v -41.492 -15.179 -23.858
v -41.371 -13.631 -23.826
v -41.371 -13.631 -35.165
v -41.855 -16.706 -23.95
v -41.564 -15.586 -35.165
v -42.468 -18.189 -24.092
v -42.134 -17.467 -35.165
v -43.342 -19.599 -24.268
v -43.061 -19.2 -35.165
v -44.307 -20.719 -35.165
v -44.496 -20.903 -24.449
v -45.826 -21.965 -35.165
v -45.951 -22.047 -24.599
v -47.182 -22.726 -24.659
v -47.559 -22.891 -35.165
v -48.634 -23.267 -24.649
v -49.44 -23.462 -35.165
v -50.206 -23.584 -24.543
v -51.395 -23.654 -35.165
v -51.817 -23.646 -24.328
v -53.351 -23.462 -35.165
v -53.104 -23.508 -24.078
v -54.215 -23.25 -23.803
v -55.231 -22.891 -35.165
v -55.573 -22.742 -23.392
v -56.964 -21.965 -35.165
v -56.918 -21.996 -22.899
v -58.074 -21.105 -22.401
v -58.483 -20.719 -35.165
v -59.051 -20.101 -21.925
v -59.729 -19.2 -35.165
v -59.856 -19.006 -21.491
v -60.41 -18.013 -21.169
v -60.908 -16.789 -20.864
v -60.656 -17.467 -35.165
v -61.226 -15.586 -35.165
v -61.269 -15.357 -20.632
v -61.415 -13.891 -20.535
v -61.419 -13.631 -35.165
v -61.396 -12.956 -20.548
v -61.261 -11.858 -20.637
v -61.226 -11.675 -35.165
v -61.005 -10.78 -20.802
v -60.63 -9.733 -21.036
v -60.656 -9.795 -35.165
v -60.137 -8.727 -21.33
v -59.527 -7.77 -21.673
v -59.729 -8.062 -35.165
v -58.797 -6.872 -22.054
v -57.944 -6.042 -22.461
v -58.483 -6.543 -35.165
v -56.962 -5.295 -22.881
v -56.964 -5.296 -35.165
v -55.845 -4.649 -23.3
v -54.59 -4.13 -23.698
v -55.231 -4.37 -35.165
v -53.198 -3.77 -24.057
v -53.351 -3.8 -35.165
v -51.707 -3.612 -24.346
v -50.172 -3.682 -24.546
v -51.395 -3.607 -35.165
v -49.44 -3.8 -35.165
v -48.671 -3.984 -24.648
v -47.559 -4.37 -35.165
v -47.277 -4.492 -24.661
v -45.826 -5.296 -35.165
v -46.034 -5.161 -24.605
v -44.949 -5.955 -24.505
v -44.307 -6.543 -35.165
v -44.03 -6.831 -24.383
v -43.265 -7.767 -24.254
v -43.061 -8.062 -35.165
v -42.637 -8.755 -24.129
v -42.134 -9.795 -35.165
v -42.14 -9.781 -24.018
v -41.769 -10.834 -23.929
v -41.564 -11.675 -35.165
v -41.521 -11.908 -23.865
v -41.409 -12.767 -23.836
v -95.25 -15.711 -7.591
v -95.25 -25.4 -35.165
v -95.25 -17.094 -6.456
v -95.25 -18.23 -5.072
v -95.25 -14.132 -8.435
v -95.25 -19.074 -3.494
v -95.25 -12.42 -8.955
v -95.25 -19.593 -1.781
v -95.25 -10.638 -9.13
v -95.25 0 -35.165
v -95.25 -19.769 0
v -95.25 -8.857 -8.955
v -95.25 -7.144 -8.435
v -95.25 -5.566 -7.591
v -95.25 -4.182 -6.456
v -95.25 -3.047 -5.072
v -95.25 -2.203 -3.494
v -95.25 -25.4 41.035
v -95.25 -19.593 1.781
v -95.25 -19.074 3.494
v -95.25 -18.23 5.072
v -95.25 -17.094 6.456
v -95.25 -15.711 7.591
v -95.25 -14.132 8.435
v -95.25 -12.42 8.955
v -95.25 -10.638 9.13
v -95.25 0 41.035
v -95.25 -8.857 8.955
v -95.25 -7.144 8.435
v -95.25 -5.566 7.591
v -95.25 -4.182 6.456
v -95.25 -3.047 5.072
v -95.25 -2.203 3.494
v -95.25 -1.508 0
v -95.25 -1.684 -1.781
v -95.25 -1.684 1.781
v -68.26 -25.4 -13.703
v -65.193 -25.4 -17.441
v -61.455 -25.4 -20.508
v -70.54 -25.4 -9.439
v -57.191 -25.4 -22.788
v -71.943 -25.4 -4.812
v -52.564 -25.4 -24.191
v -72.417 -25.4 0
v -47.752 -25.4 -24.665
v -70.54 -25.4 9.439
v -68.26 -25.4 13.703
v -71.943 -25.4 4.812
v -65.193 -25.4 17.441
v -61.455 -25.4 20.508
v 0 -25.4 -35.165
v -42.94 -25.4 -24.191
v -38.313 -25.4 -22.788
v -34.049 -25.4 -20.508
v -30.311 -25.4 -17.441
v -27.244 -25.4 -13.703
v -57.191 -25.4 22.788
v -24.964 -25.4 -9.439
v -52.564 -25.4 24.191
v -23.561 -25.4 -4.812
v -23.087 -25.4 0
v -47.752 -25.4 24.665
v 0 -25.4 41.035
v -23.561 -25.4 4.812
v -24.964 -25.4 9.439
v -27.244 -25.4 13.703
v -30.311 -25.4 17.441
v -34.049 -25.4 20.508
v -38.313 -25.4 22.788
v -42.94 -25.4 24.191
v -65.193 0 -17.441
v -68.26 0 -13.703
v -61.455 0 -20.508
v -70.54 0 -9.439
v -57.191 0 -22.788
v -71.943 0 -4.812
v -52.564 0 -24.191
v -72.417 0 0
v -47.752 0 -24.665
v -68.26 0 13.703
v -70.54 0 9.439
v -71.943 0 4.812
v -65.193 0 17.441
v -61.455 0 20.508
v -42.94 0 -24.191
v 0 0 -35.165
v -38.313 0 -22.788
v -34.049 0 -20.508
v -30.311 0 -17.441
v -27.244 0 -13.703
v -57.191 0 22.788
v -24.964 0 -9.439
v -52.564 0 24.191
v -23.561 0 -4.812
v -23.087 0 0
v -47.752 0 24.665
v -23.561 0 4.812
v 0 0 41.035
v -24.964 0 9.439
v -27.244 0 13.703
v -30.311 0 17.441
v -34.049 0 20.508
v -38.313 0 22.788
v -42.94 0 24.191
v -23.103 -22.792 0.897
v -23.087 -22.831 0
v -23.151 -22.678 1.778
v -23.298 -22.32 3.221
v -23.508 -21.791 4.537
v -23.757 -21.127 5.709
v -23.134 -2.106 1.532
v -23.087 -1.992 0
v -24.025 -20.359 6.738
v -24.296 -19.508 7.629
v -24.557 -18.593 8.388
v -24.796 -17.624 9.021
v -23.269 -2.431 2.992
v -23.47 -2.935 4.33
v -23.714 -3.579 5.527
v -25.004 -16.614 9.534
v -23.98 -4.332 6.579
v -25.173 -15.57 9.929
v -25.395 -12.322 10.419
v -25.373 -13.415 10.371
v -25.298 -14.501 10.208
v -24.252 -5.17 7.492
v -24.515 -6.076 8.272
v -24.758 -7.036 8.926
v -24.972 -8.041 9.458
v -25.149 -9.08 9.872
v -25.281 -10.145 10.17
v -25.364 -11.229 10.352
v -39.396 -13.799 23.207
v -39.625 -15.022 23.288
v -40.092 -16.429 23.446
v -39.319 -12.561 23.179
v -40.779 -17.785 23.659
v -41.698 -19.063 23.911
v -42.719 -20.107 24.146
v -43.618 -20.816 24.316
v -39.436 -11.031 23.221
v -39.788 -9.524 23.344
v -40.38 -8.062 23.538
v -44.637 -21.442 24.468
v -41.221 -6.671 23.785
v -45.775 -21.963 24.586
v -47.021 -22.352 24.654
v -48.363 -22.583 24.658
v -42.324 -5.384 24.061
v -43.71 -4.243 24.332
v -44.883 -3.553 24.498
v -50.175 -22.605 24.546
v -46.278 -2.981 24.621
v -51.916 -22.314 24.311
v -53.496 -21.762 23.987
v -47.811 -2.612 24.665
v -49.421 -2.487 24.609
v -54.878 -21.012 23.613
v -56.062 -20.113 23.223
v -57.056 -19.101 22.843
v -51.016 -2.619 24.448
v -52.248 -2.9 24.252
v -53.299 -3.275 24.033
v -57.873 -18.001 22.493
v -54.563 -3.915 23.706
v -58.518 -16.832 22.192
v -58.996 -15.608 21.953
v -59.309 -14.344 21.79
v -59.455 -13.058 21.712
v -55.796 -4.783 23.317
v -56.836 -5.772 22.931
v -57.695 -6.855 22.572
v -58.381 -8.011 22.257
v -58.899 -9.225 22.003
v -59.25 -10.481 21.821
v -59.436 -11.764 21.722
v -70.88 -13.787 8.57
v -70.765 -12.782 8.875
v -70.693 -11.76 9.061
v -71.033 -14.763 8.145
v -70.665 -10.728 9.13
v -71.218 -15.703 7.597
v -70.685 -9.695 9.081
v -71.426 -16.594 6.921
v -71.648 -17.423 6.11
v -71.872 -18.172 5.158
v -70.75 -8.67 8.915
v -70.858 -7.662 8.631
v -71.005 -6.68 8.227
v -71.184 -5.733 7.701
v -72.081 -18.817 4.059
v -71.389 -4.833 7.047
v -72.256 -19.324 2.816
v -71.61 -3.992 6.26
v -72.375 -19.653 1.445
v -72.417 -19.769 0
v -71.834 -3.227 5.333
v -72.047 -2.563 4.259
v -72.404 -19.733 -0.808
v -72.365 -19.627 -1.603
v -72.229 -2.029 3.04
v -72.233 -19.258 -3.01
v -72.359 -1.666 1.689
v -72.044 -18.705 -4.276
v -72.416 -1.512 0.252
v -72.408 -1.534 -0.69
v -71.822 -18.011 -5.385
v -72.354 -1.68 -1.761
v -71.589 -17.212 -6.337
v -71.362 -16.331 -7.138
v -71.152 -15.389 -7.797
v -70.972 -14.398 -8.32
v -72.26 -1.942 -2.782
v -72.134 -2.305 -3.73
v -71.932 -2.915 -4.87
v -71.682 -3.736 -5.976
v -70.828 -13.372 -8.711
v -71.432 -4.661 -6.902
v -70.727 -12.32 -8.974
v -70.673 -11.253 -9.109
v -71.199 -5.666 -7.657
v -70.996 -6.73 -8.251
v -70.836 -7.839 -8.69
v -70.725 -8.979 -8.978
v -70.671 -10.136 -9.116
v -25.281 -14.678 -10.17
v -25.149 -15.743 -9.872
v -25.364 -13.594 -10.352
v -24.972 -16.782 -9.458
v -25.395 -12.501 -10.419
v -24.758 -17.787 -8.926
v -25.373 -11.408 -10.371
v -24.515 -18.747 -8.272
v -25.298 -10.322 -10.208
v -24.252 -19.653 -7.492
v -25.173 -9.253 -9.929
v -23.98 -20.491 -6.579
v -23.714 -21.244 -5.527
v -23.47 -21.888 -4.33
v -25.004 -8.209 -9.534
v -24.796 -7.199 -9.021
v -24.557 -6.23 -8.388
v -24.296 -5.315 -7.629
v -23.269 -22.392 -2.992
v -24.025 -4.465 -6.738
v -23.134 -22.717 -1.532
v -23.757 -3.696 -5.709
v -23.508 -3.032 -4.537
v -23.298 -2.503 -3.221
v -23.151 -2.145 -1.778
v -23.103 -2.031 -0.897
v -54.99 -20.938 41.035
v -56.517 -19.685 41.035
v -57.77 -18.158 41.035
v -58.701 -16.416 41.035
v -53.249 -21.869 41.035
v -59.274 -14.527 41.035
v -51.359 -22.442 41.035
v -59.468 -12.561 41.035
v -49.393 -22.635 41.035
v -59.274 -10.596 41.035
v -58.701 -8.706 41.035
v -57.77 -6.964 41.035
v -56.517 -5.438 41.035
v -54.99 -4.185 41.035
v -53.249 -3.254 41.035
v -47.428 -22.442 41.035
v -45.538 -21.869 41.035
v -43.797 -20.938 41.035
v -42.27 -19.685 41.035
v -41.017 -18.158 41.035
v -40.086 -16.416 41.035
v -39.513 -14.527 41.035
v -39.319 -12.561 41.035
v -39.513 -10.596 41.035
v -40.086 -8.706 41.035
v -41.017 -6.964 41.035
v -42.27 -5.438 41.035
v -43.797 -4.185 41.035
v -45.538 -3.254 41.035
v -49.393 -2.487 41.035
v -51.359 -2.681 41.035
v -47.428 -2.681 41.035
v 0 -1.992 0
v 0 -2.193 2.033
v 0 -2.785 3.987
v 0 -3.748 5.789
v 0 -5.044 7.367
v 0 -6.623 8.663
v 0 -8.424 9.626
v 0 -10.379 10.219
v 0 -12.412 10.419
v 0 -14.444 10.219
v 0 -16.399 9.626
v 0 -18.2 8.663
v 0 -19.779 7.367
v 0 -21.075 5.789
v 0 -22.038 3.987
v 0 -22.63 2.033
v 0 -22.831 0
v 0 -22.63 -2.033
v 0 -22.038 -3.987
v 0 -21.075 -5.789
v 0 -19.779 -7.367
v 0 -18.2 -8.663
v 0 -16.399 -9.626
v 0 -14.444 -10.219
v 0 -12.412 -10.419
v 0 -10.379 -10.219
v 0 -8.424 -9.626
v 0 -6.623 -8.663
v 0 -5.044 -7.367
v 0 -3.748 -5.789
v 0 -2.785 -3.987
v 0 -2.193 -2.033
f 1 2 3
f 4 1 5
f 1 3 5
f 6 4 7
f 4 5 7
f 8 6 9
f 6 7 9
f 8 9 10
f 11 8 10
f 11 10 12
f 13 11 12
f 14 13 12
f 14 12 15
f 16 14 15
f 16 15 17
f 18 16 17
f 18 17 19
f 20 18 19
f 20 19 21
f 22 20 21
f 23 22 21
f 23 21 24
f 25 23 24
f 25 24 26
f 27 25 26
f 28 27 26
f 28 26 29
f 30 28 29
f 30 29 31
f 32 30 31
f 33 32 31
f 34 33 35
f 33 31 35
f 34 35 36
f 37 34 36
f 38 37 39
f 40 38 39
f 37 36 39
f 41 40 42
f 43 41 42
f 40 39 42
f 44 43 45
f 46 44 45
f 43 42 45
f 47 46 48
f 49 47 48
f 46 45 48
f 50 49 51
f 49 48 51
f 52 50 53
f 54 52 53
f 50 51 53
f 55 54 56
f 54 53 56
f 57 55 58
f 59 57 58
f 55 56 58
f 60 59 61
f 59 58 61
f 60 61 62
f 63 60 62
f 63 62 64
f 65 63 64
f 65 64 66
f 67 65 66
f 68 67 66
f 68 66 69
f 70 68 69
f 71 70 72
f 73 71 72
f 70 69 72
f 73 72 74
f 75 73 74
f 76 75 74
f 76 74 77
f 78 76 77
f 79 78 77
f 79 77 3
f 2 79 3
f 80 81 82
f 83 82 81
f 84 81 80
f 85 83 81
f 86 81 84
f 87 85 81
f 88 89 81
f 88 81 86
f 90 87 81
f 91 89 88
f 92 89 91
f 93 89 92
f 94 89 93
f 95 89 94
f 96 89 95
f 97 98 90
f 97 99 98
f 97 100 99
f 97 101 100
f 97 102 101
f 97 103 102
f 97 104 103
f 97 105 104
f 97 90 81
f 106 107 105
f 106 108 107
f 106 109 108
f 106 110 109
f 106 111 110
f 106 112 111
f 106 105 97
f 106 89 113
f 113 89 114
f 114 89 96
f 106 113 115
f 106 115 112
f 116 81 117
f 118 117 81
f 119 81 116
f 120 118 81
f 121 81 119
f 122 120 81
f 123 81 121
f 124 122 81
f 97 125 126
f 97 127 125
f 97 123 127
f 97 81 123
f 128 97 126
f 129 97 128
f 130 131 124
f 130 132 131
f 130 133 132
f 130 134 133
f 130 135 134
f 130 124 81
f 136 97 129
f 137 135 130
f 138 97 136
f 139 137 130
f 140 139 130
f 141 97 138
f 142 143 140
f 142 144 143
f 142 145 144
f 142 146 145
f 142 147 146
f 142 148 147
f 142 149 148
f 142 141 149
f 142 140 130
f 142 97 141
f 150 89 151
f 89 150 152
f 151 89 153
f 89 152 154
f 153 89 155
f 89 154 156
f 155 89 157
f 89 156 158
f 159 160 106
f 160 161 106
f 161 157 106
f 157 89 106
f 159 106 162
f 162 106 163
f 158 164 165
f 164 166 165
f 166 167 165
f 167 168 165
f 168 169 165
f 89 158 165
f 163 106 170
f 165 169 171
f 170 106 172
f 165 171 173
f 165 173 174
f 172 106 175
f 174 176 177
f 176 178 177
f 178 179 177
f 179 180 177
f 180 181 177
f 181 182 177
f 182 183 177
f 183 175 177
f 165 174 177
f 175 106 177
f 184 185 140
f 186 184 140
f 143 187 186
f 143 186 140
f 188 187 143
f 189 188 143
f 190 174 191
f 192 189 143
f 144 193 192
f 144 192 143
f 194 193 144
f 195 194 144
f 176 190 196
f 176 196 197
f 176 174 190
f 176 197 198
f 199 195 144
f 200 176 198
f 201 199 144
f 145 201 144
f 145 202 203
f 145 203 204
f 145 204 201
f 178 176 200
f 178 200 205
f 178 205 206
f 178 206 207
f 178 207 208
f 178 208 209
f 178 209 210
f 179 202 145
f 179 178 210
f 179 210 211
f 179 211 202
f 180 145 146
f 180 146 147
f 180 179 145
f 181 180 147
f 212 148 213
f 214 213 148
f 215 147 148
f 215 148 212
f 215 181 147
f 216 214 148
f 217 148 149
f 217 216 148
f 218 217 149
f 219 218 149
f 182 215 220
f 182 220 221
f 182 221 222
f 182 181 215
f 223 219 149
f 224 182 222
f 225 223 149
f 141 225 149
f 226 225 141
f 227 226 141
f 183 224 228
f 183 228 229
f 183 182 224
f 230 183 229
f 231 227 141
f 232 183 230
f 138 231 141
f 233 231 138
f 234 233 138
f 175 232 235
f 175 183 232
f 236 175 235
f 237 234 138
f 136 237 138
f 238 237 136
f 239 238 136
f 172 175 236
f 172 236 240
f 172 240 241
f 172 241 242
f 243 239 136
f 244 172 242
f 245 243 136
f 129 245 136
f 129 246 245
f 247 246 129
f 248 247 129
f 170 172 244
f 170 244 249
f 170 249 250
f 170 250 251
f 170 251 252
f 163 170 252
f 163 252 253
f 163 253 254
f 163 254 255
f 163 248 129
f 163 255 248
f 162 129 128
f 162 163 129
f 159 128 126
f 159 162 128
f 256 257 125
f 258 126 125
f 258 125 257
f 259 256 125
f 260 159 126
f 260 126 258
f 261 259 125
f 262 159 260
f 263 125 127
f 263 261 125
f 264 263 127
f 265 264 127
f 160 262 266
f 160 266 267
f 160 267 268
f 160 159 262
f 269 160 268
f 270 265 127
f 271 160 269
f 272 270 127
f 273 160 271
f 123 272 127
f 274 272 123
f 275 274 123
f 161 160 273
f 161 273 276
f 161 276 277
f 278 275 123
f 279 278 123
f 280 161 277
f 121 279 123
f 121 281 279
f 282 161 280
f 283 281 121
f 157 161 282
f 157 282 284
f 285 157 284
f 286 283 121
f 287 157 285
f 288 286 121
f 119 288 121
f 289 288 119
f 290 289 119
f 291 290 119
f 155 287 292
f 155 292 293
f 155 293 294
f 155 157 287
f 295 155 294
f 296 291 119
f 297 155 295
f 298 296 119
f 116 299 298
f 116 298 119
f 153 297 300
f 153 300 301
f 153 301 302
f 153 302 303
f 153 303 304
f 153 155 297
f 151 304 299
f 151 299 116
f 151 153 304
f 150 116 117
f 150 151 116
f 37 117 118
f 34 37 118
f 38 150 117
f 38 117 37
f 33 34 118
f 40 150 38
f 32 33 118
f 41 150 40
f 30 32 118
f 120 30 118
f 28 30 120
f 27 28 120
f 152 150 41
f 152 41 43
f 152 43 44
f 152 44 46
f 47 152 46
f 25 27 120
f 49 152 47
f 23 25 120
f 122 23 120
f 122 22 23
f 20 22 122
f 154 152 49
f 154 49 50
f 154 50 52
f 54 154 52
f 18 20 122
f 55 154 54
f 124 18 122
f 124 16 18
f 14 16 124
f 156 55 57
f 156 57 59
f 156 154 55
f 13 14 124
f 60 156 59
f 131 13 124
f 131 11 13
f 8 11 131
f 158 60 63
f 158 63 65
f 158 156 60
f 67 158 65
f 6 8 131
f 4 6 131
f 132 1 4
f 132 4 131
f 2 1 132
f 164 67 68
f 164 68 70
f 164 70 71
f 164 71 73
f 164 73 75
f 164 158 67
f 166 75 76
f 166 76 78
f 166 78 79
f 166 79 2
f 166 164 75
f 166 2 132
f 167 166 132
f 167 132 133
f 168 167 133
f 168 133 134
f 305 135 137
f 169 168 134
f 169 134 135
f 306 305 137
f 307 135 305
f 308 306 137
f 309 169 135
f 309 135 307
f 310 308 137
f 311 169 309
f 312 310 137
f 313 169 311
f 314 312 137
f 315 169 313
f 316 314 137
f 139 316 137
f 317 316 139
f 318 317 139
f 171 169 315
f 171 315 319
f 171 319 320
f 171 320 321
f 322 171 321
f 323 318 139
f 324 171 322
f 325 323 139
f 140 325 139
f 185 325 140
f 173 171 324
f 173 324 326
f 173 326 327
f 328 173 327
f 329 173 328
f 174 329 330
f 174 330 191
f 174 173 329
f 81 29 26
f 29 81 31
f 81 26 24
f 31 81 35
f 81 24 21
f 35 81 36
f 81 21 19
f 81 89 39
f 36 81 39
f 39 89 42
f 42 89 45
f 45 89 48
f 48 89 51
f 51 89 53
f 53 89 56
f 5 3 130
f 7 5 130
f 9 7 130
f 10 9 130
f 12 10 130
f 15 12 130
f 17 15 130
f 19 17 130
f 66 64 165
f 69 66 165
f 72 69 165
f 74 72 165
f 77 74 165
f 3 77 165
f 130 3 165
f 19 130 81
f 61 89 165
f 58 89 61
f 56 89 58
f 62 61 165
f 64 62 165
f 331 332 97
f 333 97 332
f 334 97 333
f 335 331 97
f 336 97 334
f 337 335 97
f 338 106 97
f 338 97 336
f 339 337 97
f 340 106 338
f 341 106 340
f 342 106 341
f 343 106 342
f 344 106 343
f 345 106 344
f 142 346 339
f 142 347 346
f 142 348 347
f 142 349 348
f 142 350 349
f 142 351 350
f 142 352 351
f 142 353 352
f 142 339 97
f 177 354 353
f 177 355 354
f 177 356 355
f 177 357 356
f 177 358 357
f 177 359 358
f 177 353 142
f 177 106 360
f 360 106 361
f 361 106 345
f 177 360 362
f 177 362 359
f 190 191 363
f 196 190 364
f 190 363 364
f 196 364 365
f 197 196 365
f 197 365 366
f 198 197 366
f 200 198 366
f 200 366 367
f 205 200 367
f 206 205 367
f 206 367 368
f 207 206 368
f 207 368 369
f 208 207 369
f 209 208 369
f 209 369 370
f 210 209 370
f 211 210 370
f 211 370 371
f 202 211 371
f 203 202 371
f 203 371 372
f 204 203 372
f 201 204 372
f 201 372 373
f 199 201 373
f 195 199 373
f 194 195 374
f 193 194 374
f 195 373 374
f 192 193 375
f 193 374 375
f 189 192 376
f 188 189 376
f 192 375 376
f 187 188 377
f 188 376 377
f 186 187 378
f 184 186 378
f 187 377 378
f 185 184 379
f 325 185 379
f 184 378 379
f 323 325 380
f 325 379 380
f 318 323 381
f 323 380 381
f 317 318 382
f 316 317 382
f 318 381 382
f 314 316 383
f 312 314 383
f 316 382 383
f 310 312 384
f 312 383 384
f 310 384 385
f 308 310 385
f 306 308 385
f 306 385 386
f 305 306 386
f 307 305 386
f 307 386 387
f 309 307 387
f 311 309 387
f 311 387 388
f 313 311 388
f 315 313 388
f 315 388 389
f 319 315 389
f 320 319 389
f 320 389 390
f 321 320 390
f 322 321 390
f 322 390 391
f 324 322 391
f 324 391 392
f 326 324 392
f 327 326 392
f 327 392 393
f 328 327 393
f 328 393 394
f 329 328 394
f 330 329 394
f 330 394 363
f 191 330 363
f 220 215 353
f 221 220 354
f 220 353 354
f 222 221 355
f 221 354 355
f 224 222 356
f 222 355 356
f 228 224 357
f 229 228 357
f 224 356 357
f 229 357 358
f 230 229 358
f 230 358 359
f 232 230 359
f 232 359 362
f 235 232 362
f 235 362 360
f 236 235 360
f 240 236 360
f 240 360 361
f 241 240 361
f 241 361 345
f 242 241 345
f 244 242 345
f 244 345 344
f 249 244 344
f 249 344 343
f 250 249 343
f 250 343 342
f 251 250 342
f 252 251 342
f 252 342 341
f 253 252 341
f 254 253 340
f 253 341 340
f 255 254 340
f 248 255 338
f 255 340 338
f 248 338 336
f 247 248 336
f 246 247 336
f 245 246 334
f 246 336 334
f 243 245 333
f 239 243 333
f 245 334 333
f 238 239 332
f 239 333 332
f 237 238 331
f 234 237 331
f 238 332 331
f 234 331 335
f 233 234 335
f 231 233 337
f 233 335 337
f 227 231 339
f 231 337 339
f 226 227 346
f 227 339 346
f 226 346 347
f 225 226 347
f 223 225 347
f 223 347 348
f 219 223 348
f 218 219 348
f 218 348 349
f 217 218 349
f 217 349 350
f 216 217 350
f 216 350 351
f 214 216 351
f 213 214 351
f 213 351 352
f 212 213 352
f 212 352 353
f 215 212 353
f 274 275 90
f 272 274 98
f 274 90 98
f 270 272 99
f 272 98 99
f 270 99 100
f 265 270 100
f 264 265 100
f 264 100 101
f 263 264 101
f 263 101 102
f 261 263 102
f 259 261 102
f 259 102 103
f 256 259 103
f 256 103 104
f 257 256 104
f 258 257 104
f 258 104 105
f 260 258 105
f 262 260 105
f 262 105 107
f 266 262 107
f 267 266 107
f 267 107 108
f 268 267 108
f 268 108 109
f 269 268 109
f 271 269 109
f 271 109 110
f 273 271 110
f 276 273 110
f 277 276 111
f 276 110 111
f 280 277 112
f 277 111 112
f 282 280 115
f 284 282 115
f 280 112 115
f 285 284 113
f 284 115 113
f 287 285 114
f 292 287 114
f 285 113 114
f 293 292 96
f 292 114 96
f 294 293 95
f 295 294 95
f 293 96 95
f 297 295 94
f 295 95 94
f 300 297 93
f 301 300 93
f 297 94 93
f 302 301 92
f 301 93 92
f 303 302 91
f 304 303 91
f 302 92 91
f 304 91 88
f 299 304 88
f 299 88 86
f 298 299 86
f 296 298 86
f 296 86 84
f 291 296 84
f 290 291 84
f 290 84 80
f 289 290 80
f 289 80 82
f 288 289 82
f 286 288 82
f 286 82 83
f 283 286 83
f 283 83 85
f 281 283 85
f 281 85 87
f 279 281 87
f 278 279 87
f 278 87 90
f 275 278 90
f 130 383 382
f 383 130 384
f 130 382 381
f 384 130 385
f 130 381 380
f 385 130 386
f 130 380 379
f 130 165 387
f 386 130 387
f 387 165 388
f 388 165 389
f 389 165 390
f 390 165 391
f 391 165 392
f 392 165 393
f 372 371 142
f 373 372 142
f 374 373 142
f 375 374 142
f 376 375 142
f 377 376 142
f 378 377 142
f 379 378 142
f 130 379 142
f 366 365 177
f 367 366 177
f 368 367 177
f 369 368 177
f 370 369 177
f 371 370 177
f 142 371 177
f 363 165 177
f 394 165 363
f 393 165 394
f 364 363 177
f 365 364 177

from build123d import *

# Parameters (mm, degrees)
F0_W      = 95.25
F0_H      = 76.2
F0_R      = 24.665224
F1_DEPTH  = 25.4
F3_R      = 10.074085
F4_DEPTH  = 25.4
F5_R      = 10.419172
F6_DEPTH  = 25.4
F7_R      = 9.130152
F8_DEPTH  = 25.4
F10_R     = 10.023697
F11_DEPTH = 25.4


with BuildPart() as f1:
    # F0 (on Front) → F1 (new body)
    with BuildSketch(Plane.XZ):
        with Locations((-47.625, 2.935028)):
            Rectangle(F0_W, F0_H)
        with Locations((-47.752, 0)):
            Circle(F0_R, mode=Mode.SUBTRACT)
    extrude(amount=F1_DEPTH)

    # F3 (on face) → F4 (cut)
    with BuildSketch(Plane.XY.offset(41.035028)):
        with Locations((-49.393464, -12.561298)):
            Circle(F3_R)
    extrude(amount=-F4_DEPTH, mode=Mode.SUBTRACT)

    # F5 (on face) → F6 (cut)
    with BuildSketch(Plane.YZ):
        with Locations((-12.411524, 0)):
            Circle(F5_R)
    extrude(amount=-F6_DEPTH, mode=Mode.SUBTRACT)

    # F7 (on face) → F8 (cut)
    with BuildSketch(Plane(origin=(-95.25, 0, 0), x_dir=(0, -1, 0), z_dir=(-1, 0, 0))):
        with Locations((10.638449, 0)):
            Circle(F7_R)
    extrude(amount=-F8_DEPTH, mode=Mode.SUBTRACT)

    # F10 (on face) → F11 (cut)
    with BuildSketch(Plane(origin=(0, 0, -35.164972), x_dir=(1, 0, 0), z_dir=(0, 0, -1))):
        with Locations((-51.3951, 13.630712)):
            Circle(F10_R)
    extrude(amount=-F11_DEPTH, mode=Mode.SUBTRACT)


solid = f1.part
